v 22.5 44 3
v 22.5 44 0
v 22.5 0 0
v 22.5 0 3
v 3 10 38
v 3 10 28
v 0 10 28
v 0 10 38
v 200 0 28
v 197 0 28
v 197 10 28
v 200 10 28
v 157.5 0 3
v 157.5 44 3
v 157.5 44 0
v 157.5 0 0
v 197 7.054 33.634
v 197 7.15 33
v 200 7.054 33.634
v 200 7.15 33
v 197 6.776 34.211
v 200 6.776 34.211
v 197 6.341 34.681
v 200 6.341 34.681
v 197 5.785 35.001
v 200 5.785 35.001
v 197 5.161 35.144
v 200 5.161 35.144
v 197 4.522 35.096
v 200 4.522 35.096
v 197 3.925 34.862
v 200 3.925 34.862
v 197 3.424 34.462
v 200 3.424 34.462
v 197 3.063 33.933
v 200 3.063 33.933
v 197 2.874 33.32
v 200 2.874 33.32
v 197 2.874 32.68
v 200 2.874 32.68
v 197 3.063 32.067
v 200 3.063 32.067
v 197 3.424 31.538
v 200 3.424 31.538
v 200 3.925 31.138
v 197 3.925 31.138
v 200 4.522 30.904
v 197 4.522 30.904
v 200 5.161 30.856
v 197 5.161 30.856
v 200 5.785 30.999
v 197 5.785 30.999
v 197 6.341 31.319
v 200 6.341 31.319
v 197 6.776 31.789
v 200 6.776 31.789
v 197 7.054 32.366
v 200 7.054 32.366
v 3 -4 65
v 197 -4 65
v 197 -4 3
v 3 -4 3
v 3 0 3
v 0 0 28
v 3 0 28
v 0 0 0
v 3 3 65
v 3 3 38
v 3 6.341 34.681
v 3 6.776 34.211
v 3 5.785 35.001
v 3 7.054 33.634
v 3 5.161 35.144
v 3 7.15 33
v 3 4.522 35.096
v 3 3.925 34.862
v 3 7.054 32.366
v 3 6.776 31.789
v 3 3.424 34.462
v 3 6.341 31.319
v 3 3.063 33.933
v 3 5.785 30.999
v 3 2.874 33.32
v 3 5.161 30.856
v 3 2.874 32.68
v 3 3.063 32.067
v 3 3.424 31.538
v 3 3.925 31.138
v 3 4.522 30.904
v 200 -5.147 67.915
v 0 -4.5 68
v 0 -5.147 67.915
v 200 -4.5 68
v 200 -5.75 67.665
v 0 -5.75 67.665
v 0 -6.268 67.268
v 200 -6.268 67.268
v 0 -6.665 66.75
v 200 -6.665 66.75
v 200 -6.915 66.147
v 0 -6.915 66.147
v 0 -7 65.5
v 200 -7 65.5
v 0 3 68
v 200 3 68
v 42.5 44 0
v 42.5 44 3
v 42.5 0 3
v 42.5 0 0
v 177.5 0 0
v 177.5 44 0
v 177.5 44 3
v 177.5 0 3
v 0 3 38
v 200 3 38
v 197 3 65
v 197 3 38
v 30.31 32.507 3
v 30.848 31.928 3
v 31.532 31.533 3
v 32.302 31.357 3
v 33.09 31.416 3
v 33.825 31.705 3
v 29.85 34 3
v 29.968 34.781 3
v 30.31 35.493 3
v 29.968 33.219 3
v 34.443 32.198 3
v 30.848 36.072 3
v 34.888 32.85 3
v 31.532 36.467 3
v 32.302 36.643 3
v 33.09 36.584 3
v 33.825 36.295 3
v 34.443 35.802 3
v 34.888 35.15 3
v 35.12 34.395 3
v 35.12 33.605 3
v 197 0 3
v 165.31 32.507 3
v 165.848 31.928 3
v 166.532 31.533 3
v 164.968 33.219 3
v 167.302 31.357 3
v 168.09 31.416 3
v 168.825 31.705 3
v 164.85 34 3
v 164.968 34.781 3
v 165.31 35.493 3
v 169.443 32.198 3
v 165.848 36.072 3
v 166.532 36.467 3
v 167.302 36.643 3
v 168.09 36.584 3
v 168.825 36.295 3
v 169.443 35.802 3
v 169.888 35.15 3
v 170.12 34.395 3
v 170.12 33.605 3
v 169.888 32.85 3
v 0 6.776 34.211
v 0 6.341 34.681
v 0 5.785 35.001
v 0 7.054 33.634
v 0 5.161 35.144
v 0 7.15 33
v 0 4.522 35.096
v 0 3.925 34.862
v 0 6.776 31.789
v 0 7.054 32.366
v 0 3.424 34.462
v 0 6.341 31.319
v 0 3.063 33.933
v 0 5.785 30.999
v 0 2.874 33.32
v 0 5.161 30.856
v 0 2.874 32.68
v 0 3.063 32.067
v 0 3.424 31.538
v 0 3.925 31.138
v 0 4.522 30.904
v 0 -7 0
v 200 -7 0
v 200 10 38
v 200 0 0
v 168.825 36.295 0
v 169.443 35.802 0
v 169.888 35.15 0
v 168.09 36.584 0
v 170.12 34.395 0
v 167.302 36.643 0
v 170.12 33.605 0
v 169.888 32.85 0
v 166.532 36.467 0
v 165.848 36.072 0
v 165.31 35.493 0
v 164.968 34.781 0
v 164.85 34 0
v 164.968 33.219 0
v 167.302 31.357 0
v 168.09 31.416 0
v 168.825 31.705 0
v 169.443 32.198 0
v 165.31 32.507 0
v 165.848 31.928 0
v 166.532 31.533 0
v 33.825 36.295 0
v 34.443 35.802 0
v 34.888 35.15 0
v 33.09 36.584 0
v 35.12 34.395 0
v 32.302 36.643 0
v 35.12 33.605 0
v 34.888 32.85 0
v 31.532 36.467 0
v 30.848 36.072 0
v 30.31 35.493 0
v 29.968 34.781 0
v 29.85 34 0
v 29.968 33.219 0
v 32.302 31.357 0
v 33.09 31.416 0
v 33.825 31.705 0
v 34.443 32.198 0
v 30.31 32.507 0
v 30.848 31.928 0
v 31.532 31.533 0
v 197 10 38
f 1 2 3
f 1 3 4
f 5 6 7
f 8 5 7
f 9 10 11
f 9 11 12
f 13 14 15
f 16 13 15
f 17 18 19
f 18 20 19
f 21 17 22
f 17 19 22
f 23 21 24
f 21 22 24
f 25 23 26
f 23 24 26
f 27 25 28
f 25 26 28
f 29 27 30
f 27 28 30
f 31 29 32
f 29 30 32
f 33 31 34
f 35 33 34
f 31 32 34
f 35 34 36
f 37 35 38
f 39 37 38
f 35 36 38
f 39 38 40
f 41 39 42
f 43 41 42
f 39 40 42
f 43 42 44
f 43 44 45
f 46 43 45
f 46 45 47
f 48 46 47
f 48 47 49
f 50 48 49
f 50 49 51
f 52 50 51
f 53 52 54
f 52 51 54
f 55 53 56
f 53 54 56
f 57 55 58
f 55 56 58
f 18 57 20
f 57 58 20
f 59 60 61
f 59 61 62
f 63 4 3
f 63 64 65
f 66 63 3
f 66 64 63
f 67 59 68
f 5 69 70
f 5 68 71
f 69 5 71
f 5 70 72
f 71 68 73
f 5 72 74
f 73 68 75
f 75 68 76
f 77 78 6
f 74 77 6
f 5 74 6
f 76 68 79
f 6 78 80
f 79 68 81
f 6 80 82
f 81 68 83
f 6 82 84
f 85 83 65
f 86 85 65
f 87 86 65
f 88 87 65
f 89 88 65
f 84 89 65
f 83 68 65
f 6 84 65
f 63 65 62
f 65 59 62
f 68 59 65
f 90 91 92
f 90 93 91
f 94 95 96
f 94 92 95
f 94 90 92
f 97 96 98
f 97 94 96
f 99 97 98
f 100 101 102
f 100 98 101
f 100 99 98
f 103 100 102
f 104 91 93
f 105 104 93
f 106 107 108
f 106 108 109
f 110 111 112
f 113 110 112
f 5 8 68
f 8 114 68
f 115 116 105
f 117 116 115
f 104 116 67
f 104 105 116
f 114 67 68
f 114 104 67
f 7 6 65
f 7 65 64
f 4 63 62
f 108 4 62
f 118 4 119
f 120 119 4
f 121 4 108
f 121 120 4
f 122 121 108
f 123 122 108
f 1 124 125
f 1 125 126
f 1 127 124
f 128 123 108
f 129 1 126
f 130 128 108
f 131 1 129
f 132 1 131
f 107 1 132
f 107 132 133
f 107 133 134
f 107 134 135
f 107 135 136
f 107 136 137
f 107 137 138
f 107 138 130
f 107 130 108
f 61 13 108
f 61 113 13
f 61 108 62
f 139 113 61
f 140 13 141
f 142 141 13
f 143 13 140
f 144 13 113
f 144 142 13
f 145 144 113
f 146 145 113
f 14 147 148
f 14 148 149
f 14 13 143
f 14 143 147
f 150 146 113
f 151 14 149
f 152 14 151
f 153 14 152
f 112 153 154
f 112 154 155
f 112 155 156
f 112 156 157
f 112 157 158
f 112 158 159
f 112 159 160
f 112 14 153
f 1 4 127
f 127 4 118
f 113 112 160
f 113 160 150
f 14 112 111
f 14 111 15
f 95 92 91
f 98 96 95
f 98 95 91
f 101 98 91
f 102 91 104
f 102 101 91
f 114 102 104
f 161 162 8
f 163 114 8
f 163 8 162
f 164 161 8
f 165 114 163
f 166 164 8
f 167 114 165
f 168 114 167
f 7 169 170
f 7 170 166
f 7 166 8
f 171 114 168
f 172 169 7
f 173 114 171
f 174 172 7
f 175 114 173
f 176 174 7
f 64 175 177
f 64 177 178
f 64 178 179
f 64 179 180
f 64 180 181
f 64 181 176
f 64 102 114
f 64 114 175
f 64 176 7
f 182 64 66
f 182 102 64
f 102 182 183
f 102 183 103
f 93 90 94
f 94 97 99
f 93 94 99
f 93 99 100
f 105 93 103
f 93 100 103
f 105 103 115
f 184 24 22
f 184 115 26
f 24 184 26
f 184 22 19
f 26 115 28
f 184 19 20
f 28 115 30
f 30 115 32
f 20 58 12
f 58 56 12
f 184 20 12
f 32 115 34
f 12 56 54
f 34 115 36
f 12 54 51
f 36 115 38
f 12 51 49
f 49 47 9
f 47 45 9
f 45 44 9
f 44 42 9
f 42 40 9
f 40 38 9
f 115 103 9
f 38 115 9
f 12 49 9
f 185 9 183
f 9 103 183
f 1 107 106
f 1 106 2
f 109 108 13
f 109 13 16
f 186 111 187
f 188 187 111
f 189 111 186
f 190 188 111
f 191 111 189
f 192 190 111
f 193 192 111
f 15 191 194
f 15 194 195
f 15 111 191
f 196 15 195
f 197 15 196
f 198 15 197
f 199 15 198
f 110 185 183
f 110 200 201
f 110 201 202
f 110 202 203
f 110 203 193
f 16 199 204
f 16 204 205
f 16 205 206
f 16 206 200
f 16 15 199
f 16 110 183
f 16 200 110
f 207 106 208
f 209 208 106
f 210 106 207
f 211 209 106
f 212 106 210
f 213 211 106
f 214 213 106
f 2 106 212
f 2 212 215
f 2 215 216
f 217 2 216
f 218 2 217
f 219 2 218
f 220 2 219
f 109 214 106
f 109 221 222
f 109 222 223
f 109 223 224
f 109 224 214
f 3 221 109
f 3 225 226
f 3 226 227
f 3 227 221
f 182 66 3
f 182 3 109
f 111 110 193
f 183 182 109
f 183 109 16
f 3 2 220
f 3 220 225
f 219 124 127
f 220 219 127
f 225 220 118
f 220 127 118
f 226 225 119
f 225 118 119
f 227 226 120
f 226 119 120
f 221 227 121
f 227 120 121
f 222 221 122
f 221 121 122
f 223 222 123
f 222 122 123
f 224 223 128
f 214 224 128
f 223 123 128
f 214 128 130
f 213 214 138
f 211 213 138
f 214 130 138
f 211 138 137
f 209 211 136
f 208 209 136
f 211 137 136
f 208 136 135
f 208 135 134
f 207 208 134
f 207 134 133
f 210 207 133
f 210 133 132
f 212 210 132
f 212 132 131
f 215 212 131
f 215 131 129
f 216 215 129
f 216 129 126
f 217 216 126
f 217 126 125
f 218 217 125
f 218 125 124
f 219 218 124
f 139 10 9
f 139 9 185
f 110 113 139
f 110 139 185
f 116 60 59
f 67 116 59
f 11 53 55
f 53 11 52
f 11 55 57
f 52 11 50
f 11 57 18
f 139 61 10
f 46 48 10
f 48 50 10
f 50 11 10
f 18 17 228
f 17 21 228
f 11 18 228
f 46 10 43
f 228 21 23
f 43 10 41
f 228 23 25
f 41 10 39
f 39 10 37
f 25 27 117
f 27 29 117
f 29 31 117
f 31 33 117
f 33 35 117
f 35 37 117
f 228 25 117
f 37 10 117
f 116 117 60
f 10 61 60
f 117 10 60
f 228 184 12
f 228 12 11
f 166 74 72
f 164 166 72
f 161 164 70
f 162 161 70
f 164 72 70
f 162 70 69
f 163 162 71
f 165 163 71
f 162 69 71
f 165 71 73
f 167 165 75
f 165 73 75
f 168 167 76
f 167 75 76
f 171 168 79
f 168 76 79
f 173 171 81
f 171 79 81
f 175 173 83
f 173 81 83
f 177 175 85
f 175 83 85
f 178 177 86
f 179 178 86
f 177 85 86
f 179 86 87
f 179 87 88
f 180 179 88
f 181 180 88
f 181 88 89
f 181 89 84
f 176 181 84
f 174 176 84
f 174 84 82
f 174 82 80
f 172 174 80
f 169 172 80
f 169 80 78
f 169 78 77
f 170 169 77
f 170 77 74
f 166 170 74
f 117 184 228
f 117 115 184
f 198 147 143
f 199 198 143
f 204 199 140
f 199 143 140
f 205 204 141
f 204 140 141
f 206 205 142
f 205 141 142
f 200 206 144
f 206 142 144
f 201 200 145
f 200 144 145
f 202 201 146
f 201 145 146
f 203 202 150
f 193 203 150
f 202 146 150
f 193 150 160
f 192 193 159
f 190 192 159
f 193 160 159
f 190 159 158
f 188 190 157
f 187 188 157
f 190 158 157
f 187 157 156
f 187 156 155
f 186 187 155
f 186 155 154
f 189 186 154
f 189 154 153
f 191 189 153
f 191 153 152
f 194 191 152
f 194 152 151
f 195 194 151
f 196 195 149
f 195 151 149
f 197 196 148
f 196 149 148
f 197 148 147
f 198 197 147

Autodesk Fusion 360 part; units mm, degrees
sketch "스케치1" plane through (0, 0, 0) normal (1, 0, 0) x (0, 1, 0)
  line L0 (0, 0) -> (-7, 0)
  line L1 (-7, 0) -> (-7, 68)
  line L2 (-7, 68) -> (0, 68)
  line L3 (0, 68) -> (0, 0)
  line L4 (0, 0) -> (-4, 0)
  line L5 (-4, 0) -> (-4, 68)
  line L6 (-4, 68) -> (0, 68)
  line L7 (0, 68) -> (0, 0)
  dimension "d1" = 7
  dimension "d2" = 68
  dimension "d3" = 4
extrude "돌출1" add sketch "스케치1" along normal blind 200
sketch "스케치2" plane through (0, 0, 0) normal (0, 1, 0) x (-1, 0, 0)
  line L0 (0, 0) -> (0, 68)
  line L1 (0, 68) -> (-200, 68)
  line L2 (-200, 68) -> (-200, 0)
  line L3 (-200, 0) -> (0, 0)
  line L4 (-200, 68) -> (-197, 68)
  line L5 (-197, 68) -> (-197, 65)
  line L6 (-197, 65) -> (-200, 65)
  line L7 (-200, 65) -> (-200, 68)
  line L8 (0, 0) -> (-3, 0)
  line L9 (-3, 0) -> (-3, 3)
  line L10 (-3, 3) -> (0, 3)
  line L11 (0, 3) -> (0, 0)
  line L12 (-3, 3) -> (-197, 3)
  line L13 (-197, 3) -> (-197, 65)
  line L14 (-197, 65) -> (-3, 65)
  line L15 (-3, 65) -> (-3, 3)
  dimension "d6" = 3
  dimension "d7" = 3
  dimension "d8" = 3
extrude "돌출2" cut sketch "스케치2" against normal blind 4 contours L12 L13 L14 L15
sketch "스케치3" plane through (0, 0, 0) normal (0, 1, 0) x (-1, 0, 0)
  line L0 (-197, 3) -> (-197, 65)
  line L1 (-197, 65) -> (-3, 65)
  line L2 (-3, 65) -> (-3, 3)
  line L3 (-3, 3) -> (-197, 3)
  line L4 (0, 0) -> (0, 68)
  line L5 (0, 68) -> (-200, 68)
  line L6 (-200, 68) -> (-200, 0)
  line L7 (-200, 0) -> (0, 0)
  line L8 (-197, 3) -> (-177.5, 3)
  line L9 (-177.5, 3) -> (-157.5, 3)
  line L10 (-157.5, 3) -> (-157.5, 0)
  line L11 (-157.5, 0) -> (-177.5, 0)
  line L12 (-177.5, 0) -> (-177.5, 3)
  line L13 (-3, 3) -> (-22.5, 3)
  line L14 (-22.5, 3) -> (-42.5, 3)
  line L15 (-42.5, 3) -> (-42.5, 0)
  line L16 (-42.5, 0) -> (-22.5, 0)
  line L17 (-22.5, 0) -> (-22.5, 3)
  dimension "d11" = 19.5
  dimension "d12" = 20
  dimension "d13" = 19.5
  dimension "d14" = 20
  dimension "d15" = 3
extrude "돌출3" add sketch "스케치3" along normal blind 44 contours L3 L7 L9 L10 L11 L12 | L3 L7 L14 L15 L16 L17
sketch "스케치4" plane through (0, 0, 3) normal (0, 0, 1) x (-1, 0, 0)
  line L0 (-22.5, 0) -> (-3, 0)
  line L1 (-3, 0) -> (-3, 4)
  line L2 (-3, 4) -> (-197, 4)
  line L3 (-197, 4) -> (-197, 0)
  line L4 (-197, 0) -> (-177.5, 0)
  line L5 (-177.5, 0) -> (-177.5, -44)
  line L6 (-177.5, -44) -> (-157.5, -44)
  line L7 (-157.5, -44) -> (-157.5, 0)
  line L8 (-157.5, 0) -> (-42.5, 0)
  line L9 (-42.5, 0) -> (-42.5, -44)
  line L10 (-42.5, -44) -> (-22.5, -44)
  line L11 (-22.5, -44) -> (-22.5, 0)
  line L12 (-177.5, -44) -> (-167.5, -44)
  line L13 (-167.5, -44) -> (-167.5, -34)
  line L14 (-167.5, -34) -> (-177.5, -34)
  line L15 (-177.5, -34) -> (-177.5, -44)
  line L16 (-42.5, -44) -> (-32.5, -44)
  line L17 (-32.5, -44) -> (-32.5, -34)
  line L18 (-32.5, -34) -> (-42.5, -34)
  line L19 (-42.5, -34) -> (-42.5, -44)
  circle A0 centre (-167.5, -34) radius 2.65
  circle A1 centre (-32.5, -34) radius 2.65
  dimension "d18" = 10
  dimension "d19" = 10
  dimension "d20" = 10
  dimension "d21" = 10
  dimension "d22" = 5.3
  dimension "d23" = 5.3
extrude "돌출4" cut sketch "스케치4" against normal blind 3 contours L17 L18 A1 | L17 L18 A1 | L13 L14 A0 | L13 L14 A0
fillet "필렛1" radius 2.5 1 edges at (100, -7, 68)
sketch "스케치5" plane through (0, 0, 0) normal (0, 1, 0) x (-1, 0, 0)
  line L0 (-177.5, 0) -> (-177.5, 3)
  line L1 (-177.5, 3) -> (-197, 3)
  line L2 (-197, 3) -> (-197, 65)
  line L3 (-197, 65) -> (-3, 65)
  line L4 (-3, 65) -> (-3, 3)
  line L5 (-3, 3) -> (-22.5, 3)
  line L6 (-22.5, 3) -> (-22.5, 0)
  line L7 (-22.5, 0) -> (0, 0)
  line L8 (0, 0) -> (0, 68)
  line L9 (0, 68) -> (-200, 68)
  line L10 (-200, 68) -> (-200, 0)
  line L11 (-200, 0) -> (-177.5, 0)
  line L12 (-197, 3) -> (-200, 3)
  line L13 (-200, 3) -> (-200, 38)
  line L14 (-200, 38) -> (-197, 38)
  line L15 (-197, 38) -> (-197, 3)
  line L16 (-200, 38) -> (-197, 38)
  line L17 (-197, 38) -> (-197, 28)
  line L18 (-197, 28) -> (-200, 28)
  line L19 (-200, 28) -> (-200, 38)
  line L20 (-3, 3) -> (0, 3)
  line L21 (0, 3) -> (0, 38)
  line L22 (0, 38) -> (-3, 38)
  line L23 (-3, 38) -> (-3, 3)
  line L24 (0, 38) -> (-3, 38)
  line L25 (-3, 38) -> (-3, 28)
  line L26 (-3, 28) -> (0, 28)
  line L27 (0, 28) -> (0, 38)
  dimension "d28" = 3
  dimension "d29" = 35
  dimension "d30" = 10
  dimension "d31" = 35
  dimension "d32" = 10
extrude "돌출5" add sketch "스케치5" along normal blind 10 contours L2 L10 L13 L14 L15 L16 L17 L18 L19 | L4 L8 L21 L22 L23 L24 L25 L26 L27
sketch "스케치6" plane through (200, 0, 0) normal (1, 0, 0) x (0, 1, 0)
  arc A0 (-4.5, 68) -> (-7, 65.5) centre (-4.5, 65.5) ccw
  line L0 (-7, 65.5) -> (-7, 0)
  line L1 (-7, 0) -> (0, 0)
  line L2 (0, 0) -> (0, 28)
  line L3 (0, 28) -> (10, 28)
  line L4 (10, 28) -> (10, 38)
  line L5 (10, 38) -> (0, 38)
  line L6 (0, 38) -> (0, 68)
  line L7 (0, 68) -> (-4.5, 68)
  line L8 (10, 38) -> (5, 38)
  line L9 (5, 38) -> (5, 33)
  line L10 (5, 33) -> (10, 33)
  line L11 (10, 33) -> (10, 38)
  circle A1 centre (5, 33) radius 2.15
  dimension "d35" = 5
  dimension "d36" = 5
  dimension "d37" = 4.3
extrude "돌출6" cut sketch "스케치6" against normal blind 260 contours L9 L10 A1 | L9 L10 A1
extrude "돌출7" add 1 faces at (67.6667, 0, 67) along direction (0, 1, 0) blind 3
